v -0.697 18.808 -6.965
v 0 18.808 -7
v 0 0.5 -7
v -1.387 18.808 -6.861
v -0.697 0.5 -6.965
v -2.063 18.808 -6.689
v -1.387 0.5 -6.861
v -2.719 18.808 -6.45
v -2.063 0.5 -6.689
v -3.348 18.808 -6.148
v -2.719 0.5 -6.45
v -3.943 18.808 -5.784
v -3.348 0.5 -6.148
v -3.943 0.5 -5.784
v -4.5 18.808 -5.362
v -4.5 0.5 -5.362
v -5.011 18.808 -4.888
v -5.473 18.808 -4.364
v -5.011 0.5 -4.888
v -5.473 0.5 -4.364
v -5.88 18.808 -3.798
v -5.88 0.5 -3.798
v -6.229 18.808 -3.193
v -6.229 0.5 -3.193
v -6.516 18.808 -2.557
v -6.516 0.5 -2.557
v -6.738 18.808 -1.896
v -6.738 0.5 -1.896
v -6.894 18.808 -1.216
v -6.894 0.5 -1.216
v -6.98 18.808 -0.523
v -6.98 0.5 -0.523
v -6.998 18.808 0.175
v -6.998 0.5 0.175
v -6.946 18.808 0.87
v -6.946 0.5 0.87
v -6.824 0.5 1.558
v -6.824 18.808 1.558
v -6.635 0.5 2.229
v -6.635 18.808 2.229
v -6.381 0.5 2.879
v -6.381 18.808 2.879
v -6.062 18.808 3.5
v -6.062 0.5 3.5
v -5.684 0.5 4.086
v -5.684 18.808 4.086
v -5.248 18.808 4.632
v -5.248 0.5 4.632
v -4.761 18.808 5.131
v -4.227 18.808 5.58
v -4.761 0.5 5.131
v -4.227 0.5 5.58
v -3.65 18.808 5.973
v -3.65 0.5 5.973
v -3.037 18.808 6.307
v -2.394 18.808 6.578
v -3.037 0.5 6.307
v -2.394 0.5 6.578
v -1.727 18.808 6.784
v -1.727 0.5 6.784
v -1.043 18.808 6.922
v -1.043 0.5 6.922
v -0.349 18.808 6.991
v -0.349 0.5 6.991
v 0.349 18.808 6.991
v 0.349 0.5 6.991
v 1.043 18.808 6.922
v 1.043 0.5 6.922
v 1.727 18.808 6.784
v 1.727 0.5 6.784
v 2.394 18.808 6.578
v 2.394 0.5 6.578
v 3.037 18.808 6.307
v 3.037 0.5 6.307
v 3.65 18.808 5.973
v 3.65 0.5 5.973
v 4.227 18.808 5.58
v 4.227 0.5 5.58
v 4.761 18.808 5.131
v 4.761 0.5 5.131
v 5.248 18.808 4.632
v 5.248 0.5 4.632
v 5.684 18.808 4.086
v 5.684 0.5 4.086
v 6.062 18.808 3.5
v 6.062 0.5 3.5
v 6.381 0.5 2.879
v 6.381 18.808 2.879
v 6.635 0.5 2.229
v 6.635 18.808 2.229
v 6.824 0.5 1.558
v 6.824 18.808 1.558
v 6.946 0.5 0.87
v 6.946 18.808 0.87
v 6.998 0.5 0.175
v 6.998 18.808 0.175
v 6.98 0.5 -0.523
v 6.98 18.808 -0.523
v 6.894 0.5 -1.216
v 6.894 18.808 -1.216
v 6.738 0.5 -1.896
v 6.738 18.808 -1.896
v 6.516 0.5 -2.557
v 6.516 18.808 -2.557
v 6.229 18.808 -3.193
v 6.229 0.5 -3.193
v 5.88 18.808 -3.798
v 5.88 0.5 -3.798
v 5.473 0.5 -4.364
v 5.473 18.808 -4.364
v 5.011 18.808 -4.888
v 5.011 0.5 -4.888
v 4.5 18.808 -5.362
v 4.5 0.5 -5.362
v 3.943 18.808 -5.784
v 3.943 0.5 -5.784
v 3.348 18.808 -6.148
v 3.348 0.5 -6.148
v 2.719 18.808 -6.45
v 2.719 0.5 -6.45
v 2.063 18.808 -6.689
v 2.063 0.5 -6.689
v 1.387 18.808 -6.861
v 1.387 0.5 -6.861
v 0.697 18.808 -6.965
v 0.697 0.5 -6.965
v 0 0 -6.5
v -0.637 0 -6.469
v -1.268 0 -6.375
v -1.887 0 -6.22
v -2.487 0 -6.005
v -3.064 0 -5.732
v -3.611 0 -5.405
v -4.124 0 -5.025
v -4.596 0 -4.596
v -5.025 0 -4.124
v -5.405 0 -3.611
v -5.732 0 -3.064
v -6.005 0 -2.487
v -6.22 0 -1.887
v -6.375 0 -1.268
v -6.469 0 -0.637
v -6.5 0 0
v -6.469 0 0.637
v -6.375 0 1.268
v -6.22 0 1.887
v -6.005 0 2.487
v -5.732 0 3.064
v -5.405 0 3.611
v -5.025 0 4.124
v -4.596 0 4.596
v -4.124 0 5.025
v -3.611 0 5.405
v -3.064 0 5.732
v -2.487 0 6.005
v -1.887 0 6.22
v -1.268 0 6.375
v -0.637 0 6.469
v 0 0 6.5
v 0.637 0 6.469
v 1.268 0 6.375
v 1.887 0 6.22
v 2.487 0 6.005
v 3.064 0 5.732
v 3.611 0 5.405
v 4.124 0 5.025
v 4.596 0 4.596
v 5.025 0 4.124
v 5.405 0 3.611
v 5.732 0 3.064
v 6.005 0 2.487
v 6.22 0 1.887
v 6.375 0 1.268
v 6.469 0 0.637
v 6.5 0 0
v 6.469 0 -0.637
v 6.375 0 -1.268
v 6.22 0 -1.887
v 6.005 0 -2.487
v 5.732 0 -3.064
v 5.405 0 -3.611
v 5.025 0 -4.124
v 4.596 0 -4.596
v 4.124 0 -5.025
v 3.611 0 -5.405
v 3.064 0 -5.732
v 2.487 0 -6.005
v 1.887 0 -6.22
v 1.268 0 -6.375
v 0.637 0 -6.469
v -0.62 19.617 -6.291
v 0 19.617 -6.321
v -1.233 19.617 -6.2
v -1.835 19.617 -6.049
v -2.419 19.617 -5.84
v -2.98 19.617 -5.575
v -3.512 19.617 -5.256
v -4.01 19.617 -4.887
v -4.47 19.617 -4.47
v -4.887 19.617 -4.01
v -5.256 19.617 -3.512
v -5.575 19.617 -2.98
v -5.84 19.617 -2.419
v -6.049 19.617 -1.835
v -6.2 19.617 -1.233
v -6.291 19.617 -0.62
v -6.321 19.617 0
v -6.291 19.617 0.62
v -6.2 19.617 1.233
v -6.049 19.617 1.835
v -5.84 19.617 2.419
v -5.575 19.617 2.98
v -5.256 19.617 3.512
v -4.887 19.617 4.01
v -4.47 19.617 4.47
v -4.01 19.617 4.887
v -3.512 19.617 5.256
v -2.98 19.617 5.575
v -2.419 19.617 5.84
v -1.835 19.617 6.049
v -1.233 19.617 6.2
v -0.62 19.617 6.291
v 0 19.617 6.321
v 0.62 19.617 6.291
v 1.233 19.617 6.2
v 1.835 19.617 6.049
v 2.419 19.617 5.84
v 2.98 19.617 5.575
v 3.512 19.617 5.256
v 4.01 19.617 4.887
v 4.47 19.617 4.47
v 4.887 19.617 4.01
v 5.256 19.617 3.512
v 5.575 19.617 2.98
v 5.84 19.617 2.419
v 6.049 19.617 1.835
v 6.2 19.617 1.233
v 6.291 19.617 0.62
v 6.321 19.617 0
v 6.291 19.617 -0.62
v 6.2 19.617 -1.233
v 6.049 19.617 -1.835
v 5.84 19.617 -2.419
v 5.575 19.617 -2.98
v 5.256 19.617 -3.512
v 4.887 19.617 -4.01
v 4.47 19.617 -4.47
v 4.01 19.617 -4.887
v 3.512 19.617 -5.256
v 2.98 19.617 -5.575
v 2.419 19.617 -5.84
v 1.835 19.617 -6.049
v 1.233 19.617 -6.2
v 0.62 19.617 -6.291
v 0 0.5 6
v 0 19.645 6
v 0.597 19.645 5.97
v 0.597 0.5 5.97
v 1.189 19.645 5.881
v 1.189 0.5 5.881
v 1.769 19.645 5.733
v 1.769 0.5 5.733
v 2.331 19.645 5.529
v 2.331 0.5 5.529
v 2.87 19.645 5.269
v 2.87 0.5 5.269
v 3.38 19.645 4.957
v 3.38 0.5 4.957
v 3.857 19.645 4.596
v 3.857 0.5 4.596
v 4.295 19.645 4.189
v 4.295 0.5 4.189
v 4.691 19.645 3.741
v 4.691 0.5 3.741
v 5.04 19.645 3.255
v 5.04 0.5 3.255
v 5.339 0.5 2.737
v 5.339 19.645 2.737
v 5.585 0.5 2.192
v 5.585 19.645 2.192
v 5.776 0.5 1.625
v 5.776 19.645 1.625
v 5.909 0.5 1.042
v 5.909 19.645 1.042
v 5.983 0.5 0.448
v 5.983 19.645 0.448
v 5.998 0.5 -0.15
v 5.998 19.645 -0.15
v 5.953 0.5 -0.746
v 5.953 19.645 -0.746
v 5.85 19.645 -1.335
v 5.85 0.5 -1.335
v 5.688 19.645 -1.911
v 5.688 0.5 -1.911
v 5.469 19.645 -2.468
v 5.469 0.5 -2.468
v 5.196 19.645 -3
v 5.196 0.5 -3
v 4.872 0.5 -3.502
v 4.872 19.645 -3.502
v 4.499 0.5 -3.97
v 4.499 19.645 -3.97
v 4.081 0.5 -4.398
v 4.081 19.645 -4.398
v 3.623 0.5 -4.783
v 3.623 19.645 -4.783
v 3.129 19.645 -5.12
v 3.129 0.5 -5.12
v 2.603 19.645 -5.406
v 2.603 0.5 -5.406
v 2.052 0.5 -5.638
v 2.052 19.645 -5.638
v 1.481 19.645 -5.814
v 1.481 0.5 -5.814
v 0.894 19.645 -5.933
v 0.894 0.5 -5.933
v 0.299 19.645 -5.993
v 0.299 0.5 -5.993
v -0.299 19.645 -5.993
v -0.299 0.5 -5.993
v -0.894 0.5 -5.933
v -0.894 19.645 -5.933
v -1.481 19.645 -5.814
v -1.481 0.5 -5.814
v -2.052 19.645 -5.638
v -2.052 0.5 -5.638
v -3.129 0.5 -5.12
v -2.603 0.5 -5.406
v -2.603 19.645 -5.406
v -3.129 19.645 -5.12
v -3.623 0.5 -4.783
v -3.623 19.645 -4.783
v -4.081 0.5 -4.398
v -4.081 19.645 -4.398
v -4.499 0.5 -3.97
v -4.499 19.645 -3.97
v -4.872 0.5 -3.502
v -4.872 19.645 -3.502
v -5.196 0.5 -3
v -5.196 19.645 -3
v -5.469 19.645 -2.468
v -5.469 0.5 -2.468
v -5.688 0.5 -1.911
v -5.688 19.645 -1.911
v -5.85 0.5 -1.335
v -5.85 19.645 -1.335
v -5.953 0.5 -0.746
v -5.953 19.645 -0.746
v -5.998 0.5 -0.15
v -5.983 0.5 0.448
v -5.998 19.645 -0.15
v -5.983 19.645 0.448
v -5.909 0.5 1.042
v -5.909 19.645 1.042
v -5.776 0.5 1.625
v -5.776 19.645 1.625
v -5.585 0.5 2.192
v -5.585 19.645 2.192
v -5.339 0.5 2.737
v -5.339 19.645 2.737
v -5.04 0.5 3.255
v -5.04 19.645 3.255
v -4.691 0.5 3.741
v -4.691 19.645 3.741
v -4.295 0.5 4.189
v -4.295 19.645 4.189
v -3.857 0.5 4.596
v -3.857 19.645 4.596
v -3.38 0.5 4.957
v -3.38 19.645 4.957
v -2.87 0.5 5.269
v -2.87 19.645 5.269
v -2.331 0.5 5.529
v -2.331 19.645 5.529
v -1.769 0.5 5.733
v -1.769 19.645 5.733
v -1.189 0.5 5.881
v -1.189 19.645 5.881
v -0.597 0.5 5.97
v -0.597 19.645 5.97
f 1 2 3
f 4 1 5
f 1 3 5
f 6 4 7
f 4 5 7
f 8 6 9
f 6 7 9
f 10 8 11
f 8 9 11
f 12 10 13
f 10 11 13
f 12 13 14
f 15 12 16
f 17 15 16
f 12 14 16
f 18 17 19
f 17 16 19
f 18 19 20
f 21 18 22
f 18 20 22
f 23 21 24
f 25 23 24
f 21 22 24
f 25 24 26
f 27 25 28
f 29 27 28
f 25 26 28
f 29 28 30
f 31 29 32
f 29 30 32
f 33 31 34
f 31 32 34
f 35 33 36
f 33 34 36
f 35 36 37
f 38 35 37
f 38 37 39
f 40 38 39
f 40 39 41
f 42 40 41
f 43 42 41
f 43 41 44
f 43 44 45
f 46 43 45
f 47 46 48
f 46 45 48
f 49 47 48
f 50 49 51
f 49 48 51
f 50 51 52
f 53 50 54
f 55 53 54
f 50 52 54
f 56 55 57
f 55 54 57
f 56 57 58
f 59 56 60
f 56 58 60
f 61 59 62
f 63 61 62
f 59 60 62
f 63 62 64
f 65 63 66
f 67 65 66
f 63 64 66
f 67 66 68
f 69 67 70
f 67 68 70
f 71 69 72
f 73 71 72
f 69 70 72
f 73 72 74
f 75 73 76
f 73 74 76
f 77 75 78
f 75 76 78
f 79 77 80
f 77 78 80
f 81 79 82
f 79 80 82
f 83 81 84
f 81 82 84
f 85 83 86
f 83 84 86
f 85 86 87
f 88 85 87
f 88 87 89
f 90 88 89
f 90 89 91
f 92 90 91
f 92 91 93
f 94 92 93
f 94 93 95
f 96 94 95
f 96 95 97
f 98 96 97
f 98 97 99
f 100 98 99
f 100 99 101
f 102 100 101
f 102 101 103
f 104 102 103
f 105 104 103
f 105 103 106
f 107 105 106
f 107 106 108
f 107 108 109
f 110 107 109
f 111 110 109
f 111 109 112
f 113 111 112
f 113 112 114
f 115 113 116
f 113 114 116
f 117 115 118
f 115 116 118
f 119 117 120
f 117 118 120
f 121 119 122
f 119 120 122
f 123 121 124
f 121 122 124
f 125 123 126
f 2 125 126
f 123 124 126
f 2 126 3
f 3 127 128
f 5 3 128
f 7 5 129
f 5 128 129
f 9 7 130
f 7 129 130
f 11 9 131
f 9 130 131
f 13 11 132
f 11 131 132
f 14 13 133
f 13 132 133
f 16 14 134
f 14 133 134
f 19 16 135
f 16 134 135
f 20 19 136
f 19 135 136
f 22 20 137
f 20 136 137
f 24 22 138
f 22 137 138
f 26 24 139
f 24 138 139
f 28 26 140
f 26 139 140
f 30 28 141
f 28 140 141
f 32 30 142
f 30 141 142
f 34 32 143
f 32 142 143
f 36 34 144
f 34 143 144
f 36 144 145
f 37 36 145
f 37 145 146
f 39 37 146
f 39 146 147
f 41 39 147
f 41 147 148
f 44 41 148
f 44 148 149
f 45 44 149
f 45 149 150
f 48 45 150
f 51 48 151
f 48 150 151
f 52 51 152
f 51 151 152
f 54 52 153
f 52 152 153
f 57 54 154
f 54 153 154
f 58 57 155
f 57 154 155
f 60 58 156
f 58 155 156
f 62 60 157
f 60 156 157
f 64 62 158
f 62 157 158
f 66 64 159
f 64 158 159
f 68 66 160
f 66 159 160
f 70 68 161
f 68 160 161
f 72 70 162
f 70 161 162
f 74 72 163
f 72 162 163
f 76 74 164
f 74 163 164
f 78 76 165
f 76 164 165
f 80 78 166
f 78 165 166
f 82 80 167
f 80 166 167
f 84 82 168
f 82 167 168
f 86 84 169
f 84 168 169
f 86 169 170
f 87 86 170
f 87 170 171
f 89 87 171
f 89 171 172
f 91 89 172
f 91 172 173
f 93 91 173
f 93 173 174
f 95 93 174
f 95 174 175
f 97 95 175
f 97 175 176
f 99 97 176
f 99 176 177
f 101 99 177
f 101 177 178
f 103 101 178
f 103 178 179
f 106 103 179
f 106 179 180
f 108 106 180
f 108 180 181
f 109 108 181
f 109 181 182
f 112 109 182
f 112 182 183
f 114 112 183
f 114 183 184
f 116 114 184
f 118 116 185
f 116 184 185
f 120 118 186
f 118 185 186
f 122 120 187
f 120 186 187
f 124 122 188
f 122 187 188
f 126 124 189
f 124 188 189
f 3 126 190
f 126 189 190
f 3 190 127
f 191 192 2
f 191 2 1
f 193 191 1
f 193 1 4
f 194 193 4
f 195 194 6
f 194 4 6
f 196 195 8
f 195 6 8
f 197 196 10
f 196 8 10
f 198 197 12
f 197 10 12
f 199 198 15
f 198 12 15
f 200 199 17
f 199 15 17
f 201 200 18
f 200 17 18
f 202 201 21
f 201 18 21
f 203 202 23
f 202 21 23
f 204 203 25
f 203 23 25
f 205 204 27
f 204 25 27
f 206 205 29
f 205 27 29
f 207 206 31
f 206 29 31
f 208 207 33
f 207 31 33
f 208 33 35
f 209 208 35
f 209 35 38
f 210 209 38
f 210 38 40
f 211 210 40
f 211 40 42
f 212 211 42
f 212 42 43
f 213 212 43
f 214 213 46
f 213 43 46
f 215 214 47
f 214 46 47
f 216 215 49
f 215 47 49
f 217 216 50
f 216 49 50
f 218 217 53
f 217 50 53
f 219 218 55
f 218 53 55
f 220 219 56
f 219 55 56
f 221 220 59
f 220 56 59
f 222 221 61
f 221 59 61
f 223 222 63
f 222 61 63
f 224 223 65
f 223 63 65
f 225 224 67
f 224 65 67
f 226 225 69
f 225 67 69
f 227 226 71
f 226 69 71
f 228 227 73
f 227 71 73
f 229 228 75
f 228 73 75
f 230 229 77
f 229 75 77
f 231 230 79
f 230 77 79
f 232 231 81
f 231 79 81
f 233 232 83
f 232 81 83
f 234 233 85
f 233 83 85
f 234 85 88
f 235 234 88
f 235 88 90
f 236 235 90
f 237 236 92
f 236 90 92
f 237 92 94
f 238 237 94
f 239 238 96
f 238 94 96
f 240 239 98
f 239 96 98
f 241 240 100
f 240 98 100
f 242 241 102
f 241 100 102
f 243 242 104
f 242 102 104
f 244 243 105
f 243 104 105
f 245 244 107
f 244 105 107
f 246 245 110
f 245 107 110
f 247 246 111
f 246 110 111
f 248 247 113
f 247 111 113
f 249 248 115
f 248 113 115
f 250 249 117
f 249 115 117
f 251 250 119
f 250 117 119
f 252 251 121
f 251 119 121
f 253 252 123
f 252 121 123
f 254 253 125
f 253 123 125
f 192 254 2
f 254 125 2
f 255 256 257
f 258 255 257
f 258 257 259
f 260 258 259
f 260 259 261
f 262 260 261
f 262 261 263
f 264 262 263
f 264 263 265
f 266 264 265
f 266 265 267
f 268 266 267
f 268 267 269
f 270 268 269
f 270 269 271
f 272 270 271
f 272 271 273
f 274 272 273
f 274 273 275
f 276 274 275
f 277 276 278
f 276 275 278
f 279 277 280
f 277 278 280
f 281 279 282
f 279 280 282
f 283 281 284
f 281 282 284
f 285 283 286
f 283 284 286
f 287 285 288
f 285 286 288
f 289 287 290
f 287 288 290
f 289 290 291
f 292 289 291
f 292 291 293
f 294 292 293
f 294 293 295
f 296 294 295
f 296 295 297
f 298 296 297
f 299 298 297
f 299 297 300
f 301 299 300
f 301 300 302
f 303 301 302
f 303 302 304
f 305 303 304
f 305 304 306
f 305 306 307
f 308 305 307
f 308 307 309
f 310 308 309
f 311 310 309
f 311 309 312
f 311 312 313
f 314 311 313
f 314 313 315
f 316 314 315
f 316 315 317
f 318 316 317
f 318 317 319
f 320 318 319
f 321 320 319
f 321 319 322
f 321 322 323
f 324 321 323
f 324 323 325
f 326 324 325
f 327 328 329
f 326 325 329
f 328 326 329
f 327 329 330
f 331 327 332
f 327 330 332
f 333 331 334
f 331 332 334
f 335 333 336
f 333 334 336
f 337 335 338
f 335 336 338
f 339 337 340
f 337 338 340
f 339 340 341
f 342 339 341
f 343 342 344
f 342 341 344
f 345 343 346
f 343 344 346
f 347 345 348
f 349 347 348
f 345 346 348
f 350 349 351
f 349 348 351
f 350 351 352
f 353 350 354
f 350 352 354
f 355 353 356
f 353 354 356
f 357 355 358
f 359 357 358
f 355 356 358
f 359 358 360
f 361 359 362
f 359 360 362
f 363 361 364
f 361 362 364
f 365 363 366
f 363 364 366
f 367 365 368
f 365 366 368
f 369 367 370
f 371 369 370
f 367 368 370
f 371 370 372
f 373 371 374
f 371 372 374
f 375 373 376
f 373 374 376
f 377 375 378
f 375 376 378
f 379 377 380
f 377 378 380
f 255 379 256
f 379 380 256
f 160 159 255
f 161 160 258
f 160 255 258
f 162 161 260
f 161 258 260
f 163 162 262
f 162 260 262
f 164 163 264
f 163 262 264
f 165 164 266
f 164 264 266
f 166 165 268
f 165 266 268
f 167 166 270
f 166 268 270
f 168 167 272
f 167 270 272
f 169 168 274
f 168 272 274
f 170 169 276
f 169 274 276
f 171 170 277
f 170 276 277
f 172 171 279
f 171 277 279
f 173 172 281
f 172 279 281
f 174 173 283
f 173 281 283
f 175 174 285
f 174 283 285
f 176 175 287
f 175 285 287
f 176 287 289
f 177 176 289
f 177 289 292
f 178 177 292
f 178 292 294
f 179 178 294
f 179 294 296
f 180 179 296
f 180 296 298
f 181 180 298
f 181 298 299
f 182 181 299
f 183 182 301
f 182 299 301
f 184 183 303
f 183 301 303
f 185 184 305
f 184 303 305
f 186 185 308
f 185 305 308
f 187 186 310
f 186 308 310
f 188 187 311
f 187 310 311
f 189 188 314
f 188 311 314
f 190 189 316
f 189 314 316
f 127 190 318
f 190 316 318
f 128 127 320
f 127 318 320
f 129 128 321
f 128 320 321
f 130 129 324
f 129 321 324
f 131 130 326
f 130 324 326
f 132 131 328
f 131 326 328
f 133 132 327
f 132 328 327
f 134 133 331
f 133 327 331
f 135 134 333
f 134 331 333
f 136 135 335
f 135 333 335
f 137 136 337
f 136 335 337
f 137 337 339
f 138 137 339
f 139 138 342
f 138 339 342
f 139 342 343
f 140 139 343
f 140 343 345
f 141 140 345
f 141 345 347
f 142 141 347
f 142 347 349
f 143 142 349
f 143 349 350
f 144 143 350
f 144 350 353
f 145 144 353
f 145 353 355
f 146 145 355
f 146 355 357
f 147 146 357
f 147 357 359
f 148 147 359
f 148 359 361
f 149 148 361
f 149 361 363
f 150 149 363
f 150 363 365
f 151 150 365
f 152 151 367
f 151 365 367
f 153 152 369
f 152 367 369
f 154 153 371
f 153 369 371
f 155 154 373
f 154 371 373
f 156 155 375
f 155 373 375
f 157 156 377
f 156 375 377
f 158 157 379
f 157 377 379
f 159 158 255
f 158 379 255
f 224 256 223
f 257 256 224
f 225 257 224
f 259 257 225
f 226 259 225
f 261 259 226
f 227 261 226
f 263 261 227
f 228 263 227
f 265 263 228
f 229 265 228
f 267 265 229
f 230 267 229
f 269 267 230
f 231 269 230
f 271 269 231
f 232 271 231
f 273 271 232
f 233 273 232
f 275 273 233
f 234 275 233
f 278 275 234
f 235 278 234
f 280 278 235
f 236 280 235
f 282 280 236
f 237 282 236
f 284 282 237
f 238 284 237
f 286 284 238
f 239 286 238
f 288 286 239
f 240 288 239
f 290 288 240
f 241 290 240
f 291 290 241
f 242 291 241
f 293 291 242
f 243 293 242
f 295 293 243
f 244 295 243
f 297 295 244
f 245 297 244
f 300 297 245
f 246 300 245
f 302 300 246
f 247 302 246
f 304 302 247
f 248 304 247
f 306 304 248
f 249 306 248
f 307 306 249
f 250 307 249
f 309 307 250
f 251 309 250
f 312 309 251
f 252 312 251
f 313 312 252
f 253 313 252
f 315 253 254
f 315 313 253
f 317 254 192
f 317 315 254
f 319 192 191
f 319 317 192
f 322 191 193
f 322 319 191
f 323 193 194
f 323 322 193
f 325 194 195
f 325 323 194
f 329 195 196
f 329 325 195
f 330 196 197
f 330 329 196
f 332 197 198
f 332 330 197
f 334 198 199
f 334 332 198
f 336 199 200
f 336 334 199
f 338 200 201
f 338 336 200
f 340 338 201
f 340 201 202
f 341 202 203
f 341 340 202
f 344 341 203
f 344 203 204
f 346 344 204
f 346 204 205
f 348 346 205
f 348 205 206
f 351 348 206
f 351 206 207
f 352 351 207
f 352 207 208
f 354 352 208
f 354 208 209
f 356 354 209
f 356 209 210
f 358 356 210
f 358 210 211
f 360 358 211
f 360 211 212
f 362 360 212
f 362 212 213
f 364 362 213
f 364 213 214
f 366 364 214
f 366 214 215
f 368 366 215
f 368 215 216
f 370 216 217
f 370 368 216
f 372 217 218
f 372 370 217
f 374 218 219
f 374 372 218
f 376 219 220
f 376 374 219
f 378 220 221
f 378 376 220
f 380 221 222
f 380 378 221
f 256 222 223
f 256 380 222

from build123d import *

# Parameters (mm, degrees)
CROQUIS2_R            = 6
CORTAR_EXTRUIR1_DEPTH = 60
CHAFL_N2_SIZE         = 0.5
CHAFL_N2_SIZE_2       = 0.354903907


with BuildPart() as part:
    # Croquis1 → Revolución1 (revolve)
    with BuildSketch(Plane.XY, mode=Mode.PRIVATE) as revoluci_n1_sk:
        Polygon((-7, 18.808246407), (-7, 0), (0, 0), (0, 20), (-6, 20), align=None)
    revolve(revoluci_n1_sk.sketch.rotate(Axis((0, 0, 0), (0, 1, 0)), 270), axis=Axis((0, 0, 0), (0, 1, 0)))

    # Croquis2 → Cortar-Extruir1 (cut)
    with BuildSketch(Plane(origin=(0, 20, 0), x_dir=(1, 0, 0), z_dir=(0, 1, 0))):
        with Locations(Location((0, 0, 0), (0, 0, 270))):
            Circle(CROQUIS2_R)
    extrude(amount=-CORTAR_EXTRUIR1_DEPTH, mode=Mode.SUBTRACT)

    # Chaflán2
    # the kernel refuses this chamfer: 0.5, 0.354903907 mm, written as the material it takes off along each edge
    with BuildSketch(Plane(origin=(0, 0, 0), x_dir=(0, 0, 1), z_dir=(-1, 0, 0))) as chafl_n2_piece_1:
        Polygon((6 + CHAFL_N2_SIZE, 0), (6, CHAFL_N2_SIZE), (6, 0), align=None)
    revolve(axis=Axis((0, 0, 0), (0, 1, 0)), mode=Mode.SUBTRACT)
    with BuildSketch(Plane(origin=(0, 0, 0), x_dir=(0, 0, -1), z_dir=(1, 0, 0))) as chafl_n2_piece_2:
        Polygon((7, CHAFL_N2_SIZE), (7 - CHAFL_N2_SIZE, 0), (7, 0), align=None)
    revolve(axis=Axis((0, 0, 0), (0, 1, 0)), mode=Mode.SUBTRACT)
    with BuildSketch(Plane(origin=(0, 20, 0), x_dir=(0, 0, 1), z_dir=(-1, 0, 0))) as chafl_n2_piece_3:
        Polygon((6 + CHAFL_N2_SIZE * 0.642787609687, -CHAFL_N2_SIZE * 0.766044443119), (6, -CHAFL_N2_SIZE_2), (6, 0), align=None)
    revolve(axis=Axis((0, 20, 0), (0, 1, 0)), revolution_arc=180, mode=Mode.SUBTRACT)
    with BuildSketch(Plane(origin=(0, 20, 0), x_dir=(0, 0, -1), z_dir=(1, 0, 0))) as chafl_n2_piece_4:
        Polygon((6 + CHAFL_N2_SIZE * 0.642787609687, -CHAFL_N2_SIZE * 0.766044443119), (6, -CHAFL_N2_SIZE_2), (6, 0), align=None)
    revolve(axis=Axis((0, 20, 0), (0, 1, 0)), revolution_arc=180, mode=Mode.SUBTRACT)


solid = part.part
